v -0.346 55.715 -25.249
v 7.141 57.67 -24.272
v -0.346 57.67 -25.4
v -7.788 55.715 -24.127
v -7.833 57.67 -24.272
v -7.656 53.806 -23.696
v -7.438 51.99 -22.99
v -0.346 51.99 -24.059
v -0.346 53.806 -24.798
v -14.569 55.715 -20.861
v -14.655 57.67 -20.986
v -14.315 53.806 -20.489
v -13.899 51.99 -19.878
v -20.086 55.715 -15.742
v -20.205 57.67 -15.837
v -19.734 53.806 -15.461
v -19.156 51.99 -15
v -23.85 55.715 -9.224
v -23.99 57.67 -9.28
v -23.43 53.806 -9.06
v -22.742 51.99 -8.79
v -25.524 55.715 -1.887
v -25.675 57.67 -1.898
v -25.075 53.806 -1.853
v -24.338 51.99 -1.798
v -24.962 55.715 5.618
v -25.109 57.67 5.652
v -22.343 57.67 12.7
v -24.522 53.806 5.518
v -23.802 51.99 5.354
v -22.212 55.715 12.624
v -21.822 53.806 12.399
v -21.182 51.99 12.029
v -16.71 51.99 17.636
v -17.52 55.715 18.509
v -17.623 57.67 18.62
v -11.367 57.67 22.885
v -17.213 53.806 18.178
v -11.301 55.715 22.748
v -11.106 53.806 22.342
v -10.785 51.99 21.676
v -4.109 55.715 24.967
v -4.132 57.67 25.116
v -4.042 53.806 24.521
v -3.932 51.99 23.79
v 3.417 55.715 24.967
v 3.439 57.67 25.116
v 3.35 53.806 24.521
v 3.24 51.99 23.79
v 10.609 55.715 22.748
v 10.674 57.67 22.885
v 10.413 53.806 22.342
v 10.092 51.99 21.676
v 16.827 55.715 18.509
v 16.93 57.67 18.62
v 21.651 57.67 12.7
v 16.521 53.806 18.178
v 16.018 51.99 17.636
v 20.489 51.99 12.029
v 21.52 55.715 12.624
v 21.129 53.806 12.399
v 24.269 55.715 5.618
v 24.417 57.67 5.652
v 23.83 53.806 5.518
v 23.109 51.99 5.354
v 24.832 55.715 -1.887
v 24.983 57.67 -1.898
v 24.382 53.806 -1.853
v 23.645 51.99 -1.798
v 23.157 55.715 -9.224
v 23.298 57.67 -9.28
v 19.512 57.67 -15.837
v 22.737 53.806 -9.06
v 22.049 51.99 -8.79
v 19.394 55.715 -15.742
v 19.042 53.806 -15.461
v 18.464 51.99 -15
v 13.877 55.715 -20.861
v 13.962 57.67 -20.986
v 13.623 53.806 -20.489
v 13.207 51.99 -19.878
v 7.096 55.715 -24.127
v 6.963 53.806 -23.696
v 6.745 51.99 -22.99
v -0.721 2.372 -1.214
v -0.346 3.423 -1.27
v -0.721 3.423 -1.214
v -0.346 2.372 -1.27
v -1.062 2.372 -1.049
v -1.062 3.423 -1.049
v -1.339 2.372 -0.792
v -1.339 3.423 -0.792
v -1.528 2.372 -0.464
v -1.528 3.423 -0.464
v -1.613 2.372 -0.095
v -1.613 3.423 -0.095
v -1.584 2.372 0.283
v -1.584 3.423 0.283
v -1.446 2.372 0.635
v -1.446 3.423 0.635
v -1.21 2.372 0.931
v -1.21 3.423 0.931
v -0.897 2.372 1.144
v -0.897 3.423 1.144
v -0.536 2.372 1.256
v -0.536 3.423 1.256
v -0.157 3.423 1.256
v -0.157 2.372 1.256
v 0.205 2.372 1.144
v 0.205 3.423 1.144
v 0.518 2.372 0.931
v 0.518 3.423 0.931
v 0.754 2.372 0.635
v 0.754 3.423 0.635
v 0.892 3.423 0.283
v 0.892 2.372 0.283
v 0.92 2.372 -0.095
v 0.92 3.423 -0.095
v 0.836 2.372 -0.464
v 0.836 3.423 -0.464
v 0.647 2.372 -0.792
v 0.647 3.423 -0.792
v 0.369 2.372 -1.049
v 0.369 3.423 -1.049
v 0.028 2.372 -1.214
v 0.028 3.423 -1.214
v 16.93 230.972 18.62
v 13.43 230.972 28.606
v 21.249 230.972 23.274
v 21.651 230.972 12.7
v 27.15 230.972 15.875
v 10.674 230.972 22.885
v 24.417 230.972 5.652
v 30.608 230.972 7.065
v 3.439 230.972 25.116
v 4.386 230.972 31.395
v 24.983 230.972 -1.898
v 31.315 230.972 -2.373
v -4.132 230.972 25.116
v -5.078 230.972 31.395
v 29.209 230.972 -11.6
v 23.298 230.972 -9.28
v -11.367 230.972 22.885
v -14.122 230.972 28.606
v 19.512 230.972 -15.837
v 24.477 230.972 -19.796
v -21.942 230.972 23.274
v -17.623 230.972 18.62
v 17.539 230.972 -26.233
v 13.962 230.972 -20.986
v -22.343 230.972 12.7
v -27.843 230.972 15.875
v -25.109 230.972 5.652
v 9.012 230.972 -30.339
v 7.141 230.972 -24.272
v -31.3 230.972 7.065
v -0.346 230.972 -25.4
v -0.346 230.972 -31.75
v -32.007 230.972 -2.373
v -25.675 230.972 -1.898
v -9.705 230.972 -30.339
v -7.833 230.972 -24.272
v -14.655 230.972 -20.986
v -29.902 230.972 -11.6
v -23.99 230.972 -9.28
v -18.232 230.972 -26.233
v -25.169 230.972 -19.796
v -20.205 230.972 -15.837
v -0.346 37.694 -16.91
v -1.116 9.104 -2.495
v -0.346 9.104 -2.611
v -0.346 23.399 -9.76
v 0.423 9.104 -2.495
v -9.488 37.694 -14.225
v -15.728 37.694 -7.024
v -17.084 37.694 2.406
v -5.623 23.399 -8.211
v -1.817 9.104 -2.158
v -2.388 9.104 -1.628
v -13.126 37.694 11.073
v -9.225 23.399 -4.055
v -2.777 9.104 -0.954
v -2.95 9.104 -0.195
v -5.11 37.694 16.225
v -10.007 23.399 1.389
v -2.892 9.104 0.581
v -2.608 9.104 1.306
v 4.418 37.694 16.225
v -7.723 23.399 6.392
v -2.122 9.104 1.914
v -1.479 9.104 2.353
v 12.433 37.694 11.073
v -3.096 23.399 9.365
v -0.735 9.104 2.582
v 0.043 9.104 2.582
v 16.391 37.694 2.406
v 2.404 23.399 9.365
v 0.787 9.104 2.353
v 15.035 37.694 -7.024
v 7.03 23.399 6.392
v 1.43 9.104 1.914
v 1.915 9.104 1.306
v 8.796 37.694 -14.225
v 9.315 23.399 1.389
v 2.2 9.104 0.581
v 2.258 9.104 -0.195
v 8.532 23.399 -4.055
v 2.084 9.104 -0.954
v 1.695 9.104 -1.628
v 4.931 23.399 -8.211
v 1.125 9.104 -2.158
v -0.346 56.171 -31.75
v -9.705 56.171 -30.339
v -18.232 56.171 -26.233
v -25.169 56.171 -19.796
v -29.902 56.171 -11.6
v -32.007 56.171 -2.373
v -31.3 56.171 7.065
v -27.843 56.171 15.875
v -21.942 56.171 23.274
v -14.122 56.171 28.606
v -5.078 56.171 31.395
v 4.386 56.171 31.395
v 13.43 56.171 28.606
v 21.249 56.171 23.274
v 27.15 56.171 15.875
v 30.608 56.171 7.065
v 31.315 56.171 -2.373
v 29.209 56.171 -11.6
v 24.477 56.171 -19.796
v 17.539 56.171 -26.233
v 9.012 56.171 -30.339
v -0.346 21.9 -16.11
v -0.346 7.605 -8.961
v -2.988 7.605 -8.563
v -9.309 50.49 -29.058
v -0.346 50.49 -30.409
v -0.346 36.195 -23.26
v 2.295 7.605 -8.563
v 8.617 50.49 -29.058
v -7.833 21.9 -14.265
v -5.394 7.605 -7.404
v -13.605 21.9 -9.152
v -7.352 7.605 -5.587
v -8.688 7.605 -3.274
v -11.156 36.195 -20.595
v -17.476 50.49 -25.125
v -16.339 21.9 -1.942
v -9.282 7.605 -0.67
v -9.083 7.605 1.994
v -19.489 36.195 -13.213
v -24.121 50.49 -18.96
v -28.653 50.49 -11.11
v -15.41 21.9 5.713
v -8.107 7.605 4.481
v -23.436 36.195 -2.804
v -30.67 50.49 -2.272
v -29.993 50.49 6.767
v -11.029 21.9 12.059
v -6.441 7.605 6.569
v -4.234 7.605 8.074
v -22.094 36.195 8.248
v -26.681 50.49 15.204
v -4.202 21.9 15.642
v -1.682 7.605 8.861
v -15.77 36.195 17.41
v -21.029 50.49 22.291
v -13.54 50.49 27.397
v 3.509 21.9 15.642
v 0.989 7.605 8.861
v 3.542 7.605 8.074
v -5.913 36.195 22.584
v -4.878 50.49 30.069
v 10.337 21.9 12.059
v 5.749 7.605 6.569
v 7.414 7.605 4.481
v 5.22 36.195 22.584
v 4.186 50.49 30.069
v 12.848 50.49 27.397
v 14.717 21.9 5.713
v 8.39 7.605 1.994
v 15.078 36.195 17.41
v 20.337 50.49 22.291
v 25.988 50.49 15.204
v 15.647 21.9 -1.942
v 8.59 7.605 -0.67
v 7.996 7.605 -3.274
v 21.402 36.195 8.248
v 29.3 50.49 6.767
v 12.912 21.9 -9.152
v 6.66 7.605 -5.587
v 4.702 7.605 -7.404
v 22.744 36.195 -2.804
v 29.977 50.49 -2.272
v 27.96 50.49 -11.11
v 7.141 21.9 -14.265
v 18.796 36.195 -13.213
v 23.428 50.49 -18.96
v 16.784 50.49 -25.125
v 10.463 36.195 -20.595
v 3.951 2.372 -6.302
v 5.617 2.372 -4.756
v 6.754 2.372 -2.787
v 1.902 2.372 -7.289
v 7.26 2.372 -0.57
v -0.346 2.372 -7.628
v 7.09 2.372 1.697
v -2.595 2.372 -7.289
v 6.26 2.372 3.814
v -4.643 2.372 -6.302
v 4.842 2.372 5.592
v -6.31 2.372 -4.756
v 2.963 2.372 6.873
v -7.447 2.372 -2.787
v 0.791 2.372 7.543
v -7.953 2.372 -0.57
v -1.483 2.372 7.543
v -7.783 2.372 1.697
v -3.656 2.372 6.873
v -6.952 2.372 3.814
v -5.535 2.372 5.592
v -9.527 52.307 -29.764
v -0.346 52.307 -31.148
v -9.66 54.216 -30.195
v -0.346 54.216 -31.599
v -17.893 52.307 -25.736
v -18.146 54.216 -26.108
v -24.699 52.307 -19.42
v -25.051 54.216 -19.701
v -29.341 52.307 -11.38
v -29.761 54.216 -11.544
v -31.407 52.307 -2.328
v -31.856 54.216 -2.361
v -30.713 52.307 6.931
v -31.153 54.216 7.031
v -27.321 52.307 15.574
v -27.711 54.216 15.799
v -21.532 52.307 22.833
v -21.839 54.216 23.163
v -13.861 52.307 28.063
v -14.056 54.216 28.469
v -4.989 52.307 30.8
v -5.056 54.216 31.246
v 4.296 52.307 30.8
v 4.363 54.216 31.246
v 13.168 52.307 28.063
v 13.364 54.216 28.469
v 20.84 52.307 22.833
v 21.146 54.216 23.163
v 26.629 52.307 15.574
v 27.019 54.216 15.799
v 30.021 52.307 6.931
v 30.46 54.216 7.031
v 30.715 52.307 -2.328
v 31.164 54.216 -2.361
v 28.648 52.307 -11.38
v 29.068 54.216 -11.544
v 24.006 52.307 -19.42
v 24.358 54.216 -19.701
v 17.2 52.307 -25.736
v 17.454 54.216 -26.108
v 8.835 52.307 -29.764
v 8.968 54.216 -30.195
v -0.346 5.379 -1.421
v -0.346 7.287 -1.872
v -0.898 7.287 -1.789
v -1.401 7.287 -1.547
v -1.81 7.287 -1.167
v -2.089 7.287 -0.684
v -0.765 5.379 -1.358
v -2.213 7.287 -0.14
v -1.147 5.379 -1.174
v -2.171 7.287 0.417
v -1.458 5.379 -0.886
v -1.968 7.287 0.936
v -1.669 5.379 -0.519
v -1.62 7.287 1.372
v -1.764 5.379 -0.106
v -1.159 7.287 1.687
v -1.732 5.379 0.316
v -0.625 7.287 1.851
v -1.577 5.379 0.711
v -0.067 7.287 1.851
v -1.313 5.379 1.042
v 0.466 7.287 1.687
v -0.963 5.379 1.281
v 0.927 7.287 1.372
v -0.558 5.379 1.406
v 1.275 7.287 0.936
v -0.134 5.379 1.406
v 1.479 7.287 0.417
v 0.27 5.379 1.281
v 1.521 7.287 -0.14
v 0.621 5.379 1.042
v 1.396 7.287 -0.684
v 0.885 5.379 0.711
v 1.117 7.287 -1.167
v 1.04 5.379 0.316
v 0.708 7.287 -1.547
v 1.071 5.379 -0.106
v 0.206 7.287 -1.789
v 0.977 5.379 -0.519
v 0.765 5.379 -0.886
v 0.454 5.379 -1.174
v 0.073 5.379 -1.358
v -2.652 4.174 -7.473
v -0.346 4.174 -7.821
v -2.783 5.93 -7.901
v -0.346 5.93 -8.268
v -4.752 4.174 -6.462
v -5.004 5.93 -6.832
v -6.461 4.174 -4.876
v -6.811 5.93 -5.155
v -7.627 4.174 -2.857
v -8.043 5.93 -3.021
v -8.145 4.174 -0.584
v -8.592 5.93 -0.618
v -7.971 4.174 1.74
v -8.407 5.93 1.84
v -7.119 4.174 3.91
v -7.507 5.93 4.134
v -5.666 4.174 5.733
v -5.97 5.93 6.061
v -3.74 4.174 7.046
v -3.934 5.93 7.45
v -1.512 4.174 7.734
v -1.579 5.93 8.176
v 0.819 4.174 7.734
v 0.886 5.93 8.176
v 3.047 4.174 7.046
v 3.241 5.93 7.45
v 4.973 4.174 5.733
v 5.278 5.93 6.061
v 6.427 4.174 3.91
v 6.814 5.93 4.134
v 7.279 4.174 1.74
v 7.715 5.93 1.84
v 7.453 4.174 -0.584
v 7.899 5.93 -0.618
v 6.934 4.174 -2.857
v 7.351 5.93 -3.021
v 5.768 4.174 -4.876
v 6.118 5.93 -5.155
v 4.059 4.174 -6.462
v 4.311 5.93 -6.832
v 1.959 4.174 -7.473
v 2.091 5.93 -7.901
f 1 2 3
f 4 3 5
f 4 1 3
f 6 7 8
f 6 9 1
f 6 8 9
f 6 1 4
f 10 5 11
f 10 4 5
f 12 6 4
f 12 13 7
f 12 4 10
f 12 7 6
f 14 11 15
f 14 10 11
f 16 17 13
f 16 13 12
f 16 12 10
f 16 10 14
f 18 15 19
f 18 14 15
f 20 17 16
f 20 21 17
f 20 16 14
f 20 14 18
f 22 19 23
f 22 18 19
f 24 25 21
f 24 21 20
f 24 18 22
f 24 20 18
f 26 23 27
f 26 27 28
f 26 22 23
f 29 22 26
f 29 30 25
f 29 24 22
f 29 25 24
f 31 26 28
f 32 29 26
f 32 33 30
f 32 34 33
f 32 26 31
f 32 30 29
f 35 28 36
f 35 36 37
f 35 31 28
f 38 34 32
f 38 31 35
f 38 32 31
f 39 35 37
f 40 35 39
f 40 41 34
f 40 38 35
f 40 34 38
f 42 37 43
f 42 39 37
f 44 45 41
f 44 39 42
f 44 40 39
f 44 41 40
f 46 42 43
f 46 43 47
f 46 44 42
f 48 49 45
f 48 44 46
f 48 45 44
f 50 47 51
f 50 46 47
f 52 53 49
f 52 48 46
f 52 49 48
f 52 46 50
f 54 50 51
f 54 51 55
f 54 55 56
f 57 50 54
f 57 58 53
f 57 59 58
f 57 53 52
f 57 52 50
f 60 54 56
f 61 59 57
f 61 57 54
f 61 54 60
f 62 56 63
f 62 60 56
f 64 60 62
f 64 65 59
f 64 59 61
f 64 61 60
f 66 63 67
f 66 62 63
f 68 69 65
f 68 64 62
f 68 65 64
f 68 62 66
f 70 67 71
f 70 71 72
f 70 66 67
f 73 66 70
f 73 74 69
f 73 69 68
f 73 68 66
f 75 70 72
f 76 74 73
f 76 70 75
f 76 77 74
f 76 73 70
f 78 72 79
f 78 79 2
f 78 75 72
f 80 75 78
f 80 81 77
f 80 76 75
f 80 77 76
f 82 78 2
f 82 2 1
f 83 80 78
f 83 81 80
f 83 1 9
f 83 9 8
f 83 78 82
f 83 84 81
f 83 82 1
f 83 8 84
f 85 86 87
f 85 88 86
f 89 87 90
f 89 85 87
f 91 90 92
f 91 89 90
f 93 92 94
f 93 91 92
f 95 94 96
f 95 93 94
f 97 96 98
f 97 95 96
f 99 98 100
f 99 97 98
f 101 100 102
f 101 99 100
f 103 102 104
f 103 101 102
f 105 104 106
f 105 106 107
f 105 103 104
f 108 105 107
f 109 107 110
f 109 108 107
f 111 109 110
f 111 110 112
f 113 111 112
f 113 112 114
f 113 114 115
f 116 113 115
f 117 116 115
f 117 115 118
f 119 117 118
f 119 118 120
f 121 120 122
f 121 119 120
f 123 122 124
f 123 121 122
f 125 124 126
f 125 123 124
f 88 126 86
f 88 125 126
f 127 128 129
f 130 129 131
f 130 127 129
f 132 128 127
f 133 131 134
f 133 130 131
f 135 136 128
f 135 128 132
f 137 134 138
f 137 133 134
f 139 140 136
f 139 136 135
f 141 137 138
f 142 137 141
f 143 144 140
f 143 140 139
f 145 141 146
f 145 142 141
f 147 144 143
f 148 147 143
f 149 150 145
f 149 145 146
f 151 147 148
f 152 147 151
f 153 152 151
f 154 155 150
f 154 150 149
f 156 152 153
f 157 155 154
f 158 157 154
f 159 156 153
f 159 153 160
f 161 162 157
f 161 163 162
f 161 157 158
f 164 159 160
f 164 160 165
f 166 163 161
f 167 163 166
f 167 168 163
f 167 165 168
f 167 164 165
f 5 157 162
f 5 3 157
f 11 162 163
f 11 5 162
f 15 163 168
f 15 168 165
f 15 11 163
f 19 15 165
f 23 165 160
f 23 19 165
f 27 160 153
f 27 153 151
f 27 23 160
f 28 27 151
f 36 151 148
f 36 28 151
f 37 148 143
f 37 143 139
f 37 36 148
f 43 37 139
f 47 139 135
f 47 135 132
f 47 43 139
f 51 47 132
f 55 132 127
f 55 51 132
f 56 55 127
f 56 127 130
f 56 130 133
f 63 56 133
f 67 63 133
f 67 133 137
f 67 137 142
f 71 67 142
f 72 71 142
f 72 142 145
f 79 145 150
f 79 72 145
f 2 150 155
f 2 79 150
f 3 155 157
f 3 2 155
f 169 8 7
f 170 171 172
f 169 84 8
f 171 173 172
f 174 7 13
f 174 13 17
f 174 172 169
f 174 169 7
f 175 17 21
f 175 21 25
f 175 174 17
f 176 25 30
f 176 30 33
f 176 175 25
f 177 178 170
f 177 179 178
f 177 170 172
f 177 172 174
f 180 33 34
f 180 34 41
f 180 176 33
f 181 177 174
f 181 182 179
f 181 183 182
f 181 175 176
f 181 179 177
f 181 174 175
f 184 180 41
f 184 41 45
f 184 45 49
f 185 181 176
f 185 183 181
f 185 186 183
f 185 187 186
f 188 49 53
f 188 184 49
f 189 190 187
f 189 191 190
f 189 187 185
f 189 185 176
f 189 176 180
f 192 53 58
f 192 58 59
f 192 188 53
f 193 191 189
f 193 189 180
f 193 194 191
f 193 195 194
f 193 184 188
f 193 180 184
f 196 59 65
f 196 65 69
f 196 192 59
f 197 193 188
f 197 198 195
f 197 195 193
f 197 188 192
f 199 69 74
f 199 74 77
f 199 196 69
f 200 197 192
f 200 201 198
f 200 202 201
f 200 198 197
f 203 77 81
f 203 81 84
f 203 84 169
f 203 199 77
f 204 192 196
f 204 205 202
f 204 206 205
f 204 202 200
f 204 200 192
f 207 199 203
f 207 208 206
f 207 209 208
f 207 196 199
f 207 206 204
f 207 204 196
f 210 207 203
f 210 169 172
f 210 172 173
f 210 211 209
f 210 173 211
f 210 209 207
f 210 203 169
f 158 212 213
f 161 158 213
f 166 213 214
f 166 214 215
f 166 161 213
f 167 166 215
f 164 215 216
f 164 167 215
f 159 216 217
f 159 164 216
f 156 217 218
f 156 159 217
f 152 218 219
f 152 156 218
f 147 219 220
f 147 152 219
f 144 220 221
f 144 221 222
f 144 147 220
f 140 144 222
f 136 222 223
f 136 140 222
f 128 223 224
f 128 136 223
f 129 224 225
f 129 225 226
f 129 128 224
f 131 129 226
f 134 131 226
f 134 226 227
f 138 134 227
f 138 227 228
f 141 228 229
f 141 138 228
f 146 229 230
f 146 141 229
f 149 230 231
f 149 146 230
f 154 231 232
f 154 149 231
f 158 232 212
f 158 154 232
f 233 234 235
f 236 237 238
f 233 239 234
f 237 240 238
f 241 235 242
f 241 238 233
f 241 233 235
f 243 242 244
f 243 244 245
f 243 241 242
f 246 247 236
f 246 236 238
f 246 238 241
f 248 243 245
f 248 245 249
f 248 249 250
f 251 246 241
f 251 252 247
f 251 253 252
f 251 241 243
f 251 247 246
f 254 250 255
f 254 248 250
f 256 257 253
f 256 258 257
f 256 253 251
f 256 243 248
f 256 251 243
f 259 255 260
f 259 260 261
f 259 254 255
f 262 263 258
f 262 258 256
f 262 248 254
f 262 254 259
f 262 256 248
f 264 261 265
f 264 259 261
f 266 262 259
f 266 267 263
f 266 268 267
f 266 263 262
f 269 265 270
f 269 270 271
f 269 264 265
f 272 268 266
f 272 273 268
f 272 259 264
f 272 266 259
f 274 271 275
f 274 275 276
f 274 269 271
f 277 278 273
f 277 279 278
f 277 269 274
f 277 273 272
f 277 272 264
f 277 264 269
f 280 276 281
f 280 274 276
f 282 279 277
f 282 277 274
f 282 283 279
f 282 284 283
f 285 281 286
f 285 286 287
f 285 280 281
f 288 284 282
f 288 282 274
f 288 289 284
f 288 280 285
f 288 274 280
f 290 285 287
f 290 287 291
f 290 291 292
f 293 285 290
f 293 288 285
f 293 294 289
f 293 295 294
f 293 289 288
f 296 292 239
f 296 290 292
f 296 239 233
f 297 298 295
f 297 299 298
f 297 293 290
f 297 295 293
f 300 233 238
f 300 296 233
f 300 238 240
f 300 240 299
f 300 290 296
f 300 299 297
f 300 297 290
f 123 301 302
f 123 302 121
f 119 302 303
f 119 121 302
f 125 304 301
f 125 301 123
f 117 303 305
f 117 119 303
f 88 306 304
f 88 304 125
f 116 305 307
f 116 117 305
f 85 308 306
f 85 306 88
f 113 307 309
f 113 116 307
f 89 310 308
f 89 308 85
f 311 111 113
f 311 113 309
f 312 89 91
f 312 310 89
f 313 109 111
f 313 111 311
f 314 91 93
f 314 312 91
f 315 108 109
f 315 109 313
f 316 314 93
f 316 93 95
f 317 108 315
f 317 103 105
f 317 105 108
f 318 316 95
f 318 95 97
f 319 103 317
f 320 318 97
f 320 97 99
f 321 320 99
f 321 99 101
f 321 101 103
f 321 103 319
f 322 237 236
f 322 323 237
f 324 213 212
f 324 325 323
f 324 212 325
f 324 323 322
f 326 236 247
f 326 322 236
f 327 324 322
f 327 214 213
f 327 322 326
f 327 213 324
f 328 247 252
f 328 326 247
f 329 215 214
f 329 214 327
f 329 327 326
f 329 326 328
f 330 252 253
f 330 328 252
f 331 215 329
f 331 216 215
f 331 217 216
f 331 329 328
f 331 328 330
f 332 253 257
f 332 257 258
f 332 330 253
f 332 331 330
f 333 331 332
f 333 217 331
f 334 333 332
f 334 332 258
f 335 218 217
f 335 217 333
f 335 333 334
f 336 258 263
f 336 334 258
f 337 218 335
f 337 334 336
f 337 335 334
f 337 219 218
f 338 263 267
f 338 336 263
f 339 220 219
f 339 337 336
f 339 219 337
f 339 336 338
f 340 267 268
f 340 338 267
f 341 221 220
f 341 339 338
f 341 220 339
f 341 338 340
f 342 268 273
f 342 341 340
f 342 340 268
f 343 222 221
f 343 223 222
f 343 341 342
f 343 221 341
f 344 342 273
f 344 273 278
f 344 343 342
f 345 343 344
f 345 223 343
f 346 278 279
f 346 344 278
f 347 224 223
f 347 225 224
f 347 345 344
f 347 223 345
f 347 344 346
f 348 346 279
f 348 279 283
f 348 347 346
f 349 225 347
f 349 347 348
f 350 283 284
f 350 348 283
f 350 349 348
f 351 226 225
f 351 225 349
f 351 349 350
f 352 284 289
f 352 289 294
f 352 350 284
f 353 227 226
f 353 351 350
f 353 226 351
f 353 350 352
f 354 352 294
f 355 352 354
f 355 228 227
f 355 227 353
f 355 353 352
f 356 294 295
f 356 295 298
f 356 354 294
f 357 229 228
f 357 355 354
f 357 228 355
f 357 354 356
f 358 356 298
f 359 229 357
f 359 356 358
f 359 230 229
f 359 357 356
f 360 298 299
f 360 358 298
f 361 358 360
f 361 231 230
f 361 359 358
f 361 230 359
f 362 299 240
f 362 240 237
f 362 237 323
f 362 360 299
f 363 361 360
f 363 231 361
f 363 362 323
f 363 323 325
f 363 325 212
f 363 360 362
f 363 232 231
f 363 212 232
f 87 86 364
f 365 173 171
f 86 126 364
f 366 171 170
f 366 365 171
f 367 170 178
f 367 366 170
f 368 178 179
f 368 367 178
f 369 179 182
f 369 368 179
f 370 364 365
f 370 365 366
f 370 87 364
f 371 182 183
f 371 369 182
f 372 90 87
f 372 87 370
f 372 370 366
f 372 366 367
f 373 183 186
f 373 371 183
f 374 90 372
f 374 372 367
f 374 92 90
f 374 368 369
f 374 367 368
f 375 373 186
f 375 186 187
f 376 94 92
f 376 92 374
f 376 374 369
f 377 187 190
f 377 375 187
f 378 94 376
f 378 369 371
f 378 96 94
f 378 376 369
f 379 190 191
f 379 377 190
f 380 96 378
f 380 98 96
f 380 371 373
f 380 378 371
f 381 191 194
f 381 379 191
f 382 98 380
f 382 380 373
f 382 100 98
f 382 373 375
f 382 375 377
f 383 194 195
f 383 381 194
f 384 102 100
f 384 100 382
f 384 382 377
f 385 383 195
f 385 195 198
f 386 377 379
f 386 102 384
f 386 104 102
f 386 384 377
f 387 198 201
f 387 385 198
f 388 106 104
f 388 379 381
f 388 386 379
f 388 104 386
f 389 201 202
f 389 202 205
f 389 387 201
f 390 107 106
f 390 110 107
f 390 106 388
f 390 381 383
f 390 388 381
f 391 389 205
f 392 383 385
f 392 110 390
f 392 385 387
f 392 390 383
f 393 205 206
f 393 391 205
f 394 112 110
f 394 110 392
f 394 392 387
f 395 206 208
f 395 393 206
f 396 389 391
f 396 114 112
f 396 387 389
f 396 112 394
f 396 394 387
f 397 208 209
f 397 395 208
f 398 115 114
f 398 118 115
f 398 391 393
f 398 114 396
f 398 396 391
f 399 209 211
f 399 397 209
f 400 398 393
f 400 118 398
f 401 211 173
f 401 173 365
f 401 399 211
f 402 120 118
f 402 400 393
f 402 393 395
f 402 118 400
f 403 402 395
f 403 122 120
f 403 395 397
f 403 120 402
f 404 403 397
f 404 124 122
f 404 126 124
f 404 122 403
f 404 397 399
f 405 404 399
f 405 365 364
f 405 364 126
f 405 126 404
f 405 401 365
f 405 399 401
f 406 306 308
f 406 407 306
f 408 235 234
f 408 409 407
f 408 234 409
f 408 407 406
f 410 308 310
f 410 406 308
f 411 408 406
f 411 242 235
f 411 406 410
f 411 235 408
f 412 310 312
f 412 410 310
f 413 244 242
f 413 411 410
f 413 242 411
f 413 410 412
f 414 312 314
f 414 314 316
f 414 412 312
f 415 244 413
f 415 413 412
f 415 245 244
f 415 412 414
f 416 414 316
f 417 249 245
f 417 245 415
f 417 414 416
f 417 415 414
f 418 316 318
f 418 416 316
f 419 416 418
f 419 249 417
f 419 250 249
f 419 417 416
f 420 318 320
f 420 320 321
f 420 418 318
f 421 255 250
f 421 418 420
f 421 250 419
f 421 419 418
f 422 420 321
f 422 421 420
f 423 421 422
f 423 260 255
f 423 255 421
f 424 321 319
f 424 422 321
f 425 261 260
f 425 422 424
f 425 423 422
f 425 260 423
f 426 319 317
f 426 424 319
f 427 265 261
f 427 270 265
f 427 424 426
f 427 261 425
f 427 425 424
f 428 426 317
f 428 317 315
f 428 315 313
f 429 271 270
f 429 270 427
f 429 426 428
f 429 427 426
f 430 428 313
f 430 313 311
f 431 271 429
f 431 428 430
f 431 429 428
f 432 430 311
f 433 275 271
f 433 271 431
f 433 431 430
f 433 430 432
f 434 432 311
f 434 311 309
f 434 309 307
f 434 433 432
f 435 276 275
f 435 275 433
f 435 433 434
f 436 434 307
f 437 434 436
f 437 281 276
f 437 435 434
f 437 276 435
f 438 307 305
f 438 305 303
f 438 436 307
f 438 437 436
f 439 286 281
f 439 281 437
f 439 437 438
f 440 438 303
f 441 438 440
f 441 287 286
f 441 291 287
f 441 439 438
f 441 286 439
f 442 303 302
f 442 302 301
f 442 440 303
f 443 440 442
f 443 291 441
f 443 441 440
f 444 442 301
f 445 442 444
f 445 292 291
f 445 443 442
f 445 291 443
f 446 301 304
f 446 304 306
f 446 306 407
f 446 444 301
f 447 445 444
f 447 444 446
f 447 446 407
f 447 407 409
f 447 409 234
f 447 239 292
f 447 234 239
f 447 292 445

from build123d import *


with BuildPart() as part:
    # Sketch1 → Revolve1 (revolve)
    with BuildSketch(Plane.XY, mode=Mode.PRIVATE) as revolve1_sk:
        with BuildLine():
            Line((0.923731328, 2.372383803), (7.281644407, 2.372383803))
            ThreePointArc((7.281644407, 2.372383803), (7.667037893, 5.060184318), (8.614988038, 7.604627336))
            Line((8.614988038, 7.604627336), (30.062471525, 50.490436874))
            ThreePointArc((30.062471525, 50.490436874), (31.063868878, 53.252629767), (31.403731328, 56.171019692))
            Line((31.403731328, 56.171019692), (31.403731328, 230.972383803))
            Line((31.403731328, 230.972383803), (25.053731328, 230.972383803))
            Line((25.053731328, 230.972383803), (25.053731328, 57.670337636))
            ThreePointArc((25.053731328, 57.670337636), (24.713868878, 54.751947711), (23.712471525, 51.989754818))
            Line((23.712471525, 51.989754818), (2.264991132, 9.103951467))
            ThreePointArc((2.264991132, 9.103951467), (1.263593779, 6.341758574), (0.923731328, 3.423368649))
            Line((0.923731328, 3.423368649), (0.923731328, 2.372383803))
        make_face()
    revolve(revolve1_sk.sketch.rotate(Axis((-0.346268672, 2.373242664, 0), (0, 1, 0)), 90), axis=Axis((-0.346268672, 2.373242664, 0), (0, 1, 0)))


solid = part.part
